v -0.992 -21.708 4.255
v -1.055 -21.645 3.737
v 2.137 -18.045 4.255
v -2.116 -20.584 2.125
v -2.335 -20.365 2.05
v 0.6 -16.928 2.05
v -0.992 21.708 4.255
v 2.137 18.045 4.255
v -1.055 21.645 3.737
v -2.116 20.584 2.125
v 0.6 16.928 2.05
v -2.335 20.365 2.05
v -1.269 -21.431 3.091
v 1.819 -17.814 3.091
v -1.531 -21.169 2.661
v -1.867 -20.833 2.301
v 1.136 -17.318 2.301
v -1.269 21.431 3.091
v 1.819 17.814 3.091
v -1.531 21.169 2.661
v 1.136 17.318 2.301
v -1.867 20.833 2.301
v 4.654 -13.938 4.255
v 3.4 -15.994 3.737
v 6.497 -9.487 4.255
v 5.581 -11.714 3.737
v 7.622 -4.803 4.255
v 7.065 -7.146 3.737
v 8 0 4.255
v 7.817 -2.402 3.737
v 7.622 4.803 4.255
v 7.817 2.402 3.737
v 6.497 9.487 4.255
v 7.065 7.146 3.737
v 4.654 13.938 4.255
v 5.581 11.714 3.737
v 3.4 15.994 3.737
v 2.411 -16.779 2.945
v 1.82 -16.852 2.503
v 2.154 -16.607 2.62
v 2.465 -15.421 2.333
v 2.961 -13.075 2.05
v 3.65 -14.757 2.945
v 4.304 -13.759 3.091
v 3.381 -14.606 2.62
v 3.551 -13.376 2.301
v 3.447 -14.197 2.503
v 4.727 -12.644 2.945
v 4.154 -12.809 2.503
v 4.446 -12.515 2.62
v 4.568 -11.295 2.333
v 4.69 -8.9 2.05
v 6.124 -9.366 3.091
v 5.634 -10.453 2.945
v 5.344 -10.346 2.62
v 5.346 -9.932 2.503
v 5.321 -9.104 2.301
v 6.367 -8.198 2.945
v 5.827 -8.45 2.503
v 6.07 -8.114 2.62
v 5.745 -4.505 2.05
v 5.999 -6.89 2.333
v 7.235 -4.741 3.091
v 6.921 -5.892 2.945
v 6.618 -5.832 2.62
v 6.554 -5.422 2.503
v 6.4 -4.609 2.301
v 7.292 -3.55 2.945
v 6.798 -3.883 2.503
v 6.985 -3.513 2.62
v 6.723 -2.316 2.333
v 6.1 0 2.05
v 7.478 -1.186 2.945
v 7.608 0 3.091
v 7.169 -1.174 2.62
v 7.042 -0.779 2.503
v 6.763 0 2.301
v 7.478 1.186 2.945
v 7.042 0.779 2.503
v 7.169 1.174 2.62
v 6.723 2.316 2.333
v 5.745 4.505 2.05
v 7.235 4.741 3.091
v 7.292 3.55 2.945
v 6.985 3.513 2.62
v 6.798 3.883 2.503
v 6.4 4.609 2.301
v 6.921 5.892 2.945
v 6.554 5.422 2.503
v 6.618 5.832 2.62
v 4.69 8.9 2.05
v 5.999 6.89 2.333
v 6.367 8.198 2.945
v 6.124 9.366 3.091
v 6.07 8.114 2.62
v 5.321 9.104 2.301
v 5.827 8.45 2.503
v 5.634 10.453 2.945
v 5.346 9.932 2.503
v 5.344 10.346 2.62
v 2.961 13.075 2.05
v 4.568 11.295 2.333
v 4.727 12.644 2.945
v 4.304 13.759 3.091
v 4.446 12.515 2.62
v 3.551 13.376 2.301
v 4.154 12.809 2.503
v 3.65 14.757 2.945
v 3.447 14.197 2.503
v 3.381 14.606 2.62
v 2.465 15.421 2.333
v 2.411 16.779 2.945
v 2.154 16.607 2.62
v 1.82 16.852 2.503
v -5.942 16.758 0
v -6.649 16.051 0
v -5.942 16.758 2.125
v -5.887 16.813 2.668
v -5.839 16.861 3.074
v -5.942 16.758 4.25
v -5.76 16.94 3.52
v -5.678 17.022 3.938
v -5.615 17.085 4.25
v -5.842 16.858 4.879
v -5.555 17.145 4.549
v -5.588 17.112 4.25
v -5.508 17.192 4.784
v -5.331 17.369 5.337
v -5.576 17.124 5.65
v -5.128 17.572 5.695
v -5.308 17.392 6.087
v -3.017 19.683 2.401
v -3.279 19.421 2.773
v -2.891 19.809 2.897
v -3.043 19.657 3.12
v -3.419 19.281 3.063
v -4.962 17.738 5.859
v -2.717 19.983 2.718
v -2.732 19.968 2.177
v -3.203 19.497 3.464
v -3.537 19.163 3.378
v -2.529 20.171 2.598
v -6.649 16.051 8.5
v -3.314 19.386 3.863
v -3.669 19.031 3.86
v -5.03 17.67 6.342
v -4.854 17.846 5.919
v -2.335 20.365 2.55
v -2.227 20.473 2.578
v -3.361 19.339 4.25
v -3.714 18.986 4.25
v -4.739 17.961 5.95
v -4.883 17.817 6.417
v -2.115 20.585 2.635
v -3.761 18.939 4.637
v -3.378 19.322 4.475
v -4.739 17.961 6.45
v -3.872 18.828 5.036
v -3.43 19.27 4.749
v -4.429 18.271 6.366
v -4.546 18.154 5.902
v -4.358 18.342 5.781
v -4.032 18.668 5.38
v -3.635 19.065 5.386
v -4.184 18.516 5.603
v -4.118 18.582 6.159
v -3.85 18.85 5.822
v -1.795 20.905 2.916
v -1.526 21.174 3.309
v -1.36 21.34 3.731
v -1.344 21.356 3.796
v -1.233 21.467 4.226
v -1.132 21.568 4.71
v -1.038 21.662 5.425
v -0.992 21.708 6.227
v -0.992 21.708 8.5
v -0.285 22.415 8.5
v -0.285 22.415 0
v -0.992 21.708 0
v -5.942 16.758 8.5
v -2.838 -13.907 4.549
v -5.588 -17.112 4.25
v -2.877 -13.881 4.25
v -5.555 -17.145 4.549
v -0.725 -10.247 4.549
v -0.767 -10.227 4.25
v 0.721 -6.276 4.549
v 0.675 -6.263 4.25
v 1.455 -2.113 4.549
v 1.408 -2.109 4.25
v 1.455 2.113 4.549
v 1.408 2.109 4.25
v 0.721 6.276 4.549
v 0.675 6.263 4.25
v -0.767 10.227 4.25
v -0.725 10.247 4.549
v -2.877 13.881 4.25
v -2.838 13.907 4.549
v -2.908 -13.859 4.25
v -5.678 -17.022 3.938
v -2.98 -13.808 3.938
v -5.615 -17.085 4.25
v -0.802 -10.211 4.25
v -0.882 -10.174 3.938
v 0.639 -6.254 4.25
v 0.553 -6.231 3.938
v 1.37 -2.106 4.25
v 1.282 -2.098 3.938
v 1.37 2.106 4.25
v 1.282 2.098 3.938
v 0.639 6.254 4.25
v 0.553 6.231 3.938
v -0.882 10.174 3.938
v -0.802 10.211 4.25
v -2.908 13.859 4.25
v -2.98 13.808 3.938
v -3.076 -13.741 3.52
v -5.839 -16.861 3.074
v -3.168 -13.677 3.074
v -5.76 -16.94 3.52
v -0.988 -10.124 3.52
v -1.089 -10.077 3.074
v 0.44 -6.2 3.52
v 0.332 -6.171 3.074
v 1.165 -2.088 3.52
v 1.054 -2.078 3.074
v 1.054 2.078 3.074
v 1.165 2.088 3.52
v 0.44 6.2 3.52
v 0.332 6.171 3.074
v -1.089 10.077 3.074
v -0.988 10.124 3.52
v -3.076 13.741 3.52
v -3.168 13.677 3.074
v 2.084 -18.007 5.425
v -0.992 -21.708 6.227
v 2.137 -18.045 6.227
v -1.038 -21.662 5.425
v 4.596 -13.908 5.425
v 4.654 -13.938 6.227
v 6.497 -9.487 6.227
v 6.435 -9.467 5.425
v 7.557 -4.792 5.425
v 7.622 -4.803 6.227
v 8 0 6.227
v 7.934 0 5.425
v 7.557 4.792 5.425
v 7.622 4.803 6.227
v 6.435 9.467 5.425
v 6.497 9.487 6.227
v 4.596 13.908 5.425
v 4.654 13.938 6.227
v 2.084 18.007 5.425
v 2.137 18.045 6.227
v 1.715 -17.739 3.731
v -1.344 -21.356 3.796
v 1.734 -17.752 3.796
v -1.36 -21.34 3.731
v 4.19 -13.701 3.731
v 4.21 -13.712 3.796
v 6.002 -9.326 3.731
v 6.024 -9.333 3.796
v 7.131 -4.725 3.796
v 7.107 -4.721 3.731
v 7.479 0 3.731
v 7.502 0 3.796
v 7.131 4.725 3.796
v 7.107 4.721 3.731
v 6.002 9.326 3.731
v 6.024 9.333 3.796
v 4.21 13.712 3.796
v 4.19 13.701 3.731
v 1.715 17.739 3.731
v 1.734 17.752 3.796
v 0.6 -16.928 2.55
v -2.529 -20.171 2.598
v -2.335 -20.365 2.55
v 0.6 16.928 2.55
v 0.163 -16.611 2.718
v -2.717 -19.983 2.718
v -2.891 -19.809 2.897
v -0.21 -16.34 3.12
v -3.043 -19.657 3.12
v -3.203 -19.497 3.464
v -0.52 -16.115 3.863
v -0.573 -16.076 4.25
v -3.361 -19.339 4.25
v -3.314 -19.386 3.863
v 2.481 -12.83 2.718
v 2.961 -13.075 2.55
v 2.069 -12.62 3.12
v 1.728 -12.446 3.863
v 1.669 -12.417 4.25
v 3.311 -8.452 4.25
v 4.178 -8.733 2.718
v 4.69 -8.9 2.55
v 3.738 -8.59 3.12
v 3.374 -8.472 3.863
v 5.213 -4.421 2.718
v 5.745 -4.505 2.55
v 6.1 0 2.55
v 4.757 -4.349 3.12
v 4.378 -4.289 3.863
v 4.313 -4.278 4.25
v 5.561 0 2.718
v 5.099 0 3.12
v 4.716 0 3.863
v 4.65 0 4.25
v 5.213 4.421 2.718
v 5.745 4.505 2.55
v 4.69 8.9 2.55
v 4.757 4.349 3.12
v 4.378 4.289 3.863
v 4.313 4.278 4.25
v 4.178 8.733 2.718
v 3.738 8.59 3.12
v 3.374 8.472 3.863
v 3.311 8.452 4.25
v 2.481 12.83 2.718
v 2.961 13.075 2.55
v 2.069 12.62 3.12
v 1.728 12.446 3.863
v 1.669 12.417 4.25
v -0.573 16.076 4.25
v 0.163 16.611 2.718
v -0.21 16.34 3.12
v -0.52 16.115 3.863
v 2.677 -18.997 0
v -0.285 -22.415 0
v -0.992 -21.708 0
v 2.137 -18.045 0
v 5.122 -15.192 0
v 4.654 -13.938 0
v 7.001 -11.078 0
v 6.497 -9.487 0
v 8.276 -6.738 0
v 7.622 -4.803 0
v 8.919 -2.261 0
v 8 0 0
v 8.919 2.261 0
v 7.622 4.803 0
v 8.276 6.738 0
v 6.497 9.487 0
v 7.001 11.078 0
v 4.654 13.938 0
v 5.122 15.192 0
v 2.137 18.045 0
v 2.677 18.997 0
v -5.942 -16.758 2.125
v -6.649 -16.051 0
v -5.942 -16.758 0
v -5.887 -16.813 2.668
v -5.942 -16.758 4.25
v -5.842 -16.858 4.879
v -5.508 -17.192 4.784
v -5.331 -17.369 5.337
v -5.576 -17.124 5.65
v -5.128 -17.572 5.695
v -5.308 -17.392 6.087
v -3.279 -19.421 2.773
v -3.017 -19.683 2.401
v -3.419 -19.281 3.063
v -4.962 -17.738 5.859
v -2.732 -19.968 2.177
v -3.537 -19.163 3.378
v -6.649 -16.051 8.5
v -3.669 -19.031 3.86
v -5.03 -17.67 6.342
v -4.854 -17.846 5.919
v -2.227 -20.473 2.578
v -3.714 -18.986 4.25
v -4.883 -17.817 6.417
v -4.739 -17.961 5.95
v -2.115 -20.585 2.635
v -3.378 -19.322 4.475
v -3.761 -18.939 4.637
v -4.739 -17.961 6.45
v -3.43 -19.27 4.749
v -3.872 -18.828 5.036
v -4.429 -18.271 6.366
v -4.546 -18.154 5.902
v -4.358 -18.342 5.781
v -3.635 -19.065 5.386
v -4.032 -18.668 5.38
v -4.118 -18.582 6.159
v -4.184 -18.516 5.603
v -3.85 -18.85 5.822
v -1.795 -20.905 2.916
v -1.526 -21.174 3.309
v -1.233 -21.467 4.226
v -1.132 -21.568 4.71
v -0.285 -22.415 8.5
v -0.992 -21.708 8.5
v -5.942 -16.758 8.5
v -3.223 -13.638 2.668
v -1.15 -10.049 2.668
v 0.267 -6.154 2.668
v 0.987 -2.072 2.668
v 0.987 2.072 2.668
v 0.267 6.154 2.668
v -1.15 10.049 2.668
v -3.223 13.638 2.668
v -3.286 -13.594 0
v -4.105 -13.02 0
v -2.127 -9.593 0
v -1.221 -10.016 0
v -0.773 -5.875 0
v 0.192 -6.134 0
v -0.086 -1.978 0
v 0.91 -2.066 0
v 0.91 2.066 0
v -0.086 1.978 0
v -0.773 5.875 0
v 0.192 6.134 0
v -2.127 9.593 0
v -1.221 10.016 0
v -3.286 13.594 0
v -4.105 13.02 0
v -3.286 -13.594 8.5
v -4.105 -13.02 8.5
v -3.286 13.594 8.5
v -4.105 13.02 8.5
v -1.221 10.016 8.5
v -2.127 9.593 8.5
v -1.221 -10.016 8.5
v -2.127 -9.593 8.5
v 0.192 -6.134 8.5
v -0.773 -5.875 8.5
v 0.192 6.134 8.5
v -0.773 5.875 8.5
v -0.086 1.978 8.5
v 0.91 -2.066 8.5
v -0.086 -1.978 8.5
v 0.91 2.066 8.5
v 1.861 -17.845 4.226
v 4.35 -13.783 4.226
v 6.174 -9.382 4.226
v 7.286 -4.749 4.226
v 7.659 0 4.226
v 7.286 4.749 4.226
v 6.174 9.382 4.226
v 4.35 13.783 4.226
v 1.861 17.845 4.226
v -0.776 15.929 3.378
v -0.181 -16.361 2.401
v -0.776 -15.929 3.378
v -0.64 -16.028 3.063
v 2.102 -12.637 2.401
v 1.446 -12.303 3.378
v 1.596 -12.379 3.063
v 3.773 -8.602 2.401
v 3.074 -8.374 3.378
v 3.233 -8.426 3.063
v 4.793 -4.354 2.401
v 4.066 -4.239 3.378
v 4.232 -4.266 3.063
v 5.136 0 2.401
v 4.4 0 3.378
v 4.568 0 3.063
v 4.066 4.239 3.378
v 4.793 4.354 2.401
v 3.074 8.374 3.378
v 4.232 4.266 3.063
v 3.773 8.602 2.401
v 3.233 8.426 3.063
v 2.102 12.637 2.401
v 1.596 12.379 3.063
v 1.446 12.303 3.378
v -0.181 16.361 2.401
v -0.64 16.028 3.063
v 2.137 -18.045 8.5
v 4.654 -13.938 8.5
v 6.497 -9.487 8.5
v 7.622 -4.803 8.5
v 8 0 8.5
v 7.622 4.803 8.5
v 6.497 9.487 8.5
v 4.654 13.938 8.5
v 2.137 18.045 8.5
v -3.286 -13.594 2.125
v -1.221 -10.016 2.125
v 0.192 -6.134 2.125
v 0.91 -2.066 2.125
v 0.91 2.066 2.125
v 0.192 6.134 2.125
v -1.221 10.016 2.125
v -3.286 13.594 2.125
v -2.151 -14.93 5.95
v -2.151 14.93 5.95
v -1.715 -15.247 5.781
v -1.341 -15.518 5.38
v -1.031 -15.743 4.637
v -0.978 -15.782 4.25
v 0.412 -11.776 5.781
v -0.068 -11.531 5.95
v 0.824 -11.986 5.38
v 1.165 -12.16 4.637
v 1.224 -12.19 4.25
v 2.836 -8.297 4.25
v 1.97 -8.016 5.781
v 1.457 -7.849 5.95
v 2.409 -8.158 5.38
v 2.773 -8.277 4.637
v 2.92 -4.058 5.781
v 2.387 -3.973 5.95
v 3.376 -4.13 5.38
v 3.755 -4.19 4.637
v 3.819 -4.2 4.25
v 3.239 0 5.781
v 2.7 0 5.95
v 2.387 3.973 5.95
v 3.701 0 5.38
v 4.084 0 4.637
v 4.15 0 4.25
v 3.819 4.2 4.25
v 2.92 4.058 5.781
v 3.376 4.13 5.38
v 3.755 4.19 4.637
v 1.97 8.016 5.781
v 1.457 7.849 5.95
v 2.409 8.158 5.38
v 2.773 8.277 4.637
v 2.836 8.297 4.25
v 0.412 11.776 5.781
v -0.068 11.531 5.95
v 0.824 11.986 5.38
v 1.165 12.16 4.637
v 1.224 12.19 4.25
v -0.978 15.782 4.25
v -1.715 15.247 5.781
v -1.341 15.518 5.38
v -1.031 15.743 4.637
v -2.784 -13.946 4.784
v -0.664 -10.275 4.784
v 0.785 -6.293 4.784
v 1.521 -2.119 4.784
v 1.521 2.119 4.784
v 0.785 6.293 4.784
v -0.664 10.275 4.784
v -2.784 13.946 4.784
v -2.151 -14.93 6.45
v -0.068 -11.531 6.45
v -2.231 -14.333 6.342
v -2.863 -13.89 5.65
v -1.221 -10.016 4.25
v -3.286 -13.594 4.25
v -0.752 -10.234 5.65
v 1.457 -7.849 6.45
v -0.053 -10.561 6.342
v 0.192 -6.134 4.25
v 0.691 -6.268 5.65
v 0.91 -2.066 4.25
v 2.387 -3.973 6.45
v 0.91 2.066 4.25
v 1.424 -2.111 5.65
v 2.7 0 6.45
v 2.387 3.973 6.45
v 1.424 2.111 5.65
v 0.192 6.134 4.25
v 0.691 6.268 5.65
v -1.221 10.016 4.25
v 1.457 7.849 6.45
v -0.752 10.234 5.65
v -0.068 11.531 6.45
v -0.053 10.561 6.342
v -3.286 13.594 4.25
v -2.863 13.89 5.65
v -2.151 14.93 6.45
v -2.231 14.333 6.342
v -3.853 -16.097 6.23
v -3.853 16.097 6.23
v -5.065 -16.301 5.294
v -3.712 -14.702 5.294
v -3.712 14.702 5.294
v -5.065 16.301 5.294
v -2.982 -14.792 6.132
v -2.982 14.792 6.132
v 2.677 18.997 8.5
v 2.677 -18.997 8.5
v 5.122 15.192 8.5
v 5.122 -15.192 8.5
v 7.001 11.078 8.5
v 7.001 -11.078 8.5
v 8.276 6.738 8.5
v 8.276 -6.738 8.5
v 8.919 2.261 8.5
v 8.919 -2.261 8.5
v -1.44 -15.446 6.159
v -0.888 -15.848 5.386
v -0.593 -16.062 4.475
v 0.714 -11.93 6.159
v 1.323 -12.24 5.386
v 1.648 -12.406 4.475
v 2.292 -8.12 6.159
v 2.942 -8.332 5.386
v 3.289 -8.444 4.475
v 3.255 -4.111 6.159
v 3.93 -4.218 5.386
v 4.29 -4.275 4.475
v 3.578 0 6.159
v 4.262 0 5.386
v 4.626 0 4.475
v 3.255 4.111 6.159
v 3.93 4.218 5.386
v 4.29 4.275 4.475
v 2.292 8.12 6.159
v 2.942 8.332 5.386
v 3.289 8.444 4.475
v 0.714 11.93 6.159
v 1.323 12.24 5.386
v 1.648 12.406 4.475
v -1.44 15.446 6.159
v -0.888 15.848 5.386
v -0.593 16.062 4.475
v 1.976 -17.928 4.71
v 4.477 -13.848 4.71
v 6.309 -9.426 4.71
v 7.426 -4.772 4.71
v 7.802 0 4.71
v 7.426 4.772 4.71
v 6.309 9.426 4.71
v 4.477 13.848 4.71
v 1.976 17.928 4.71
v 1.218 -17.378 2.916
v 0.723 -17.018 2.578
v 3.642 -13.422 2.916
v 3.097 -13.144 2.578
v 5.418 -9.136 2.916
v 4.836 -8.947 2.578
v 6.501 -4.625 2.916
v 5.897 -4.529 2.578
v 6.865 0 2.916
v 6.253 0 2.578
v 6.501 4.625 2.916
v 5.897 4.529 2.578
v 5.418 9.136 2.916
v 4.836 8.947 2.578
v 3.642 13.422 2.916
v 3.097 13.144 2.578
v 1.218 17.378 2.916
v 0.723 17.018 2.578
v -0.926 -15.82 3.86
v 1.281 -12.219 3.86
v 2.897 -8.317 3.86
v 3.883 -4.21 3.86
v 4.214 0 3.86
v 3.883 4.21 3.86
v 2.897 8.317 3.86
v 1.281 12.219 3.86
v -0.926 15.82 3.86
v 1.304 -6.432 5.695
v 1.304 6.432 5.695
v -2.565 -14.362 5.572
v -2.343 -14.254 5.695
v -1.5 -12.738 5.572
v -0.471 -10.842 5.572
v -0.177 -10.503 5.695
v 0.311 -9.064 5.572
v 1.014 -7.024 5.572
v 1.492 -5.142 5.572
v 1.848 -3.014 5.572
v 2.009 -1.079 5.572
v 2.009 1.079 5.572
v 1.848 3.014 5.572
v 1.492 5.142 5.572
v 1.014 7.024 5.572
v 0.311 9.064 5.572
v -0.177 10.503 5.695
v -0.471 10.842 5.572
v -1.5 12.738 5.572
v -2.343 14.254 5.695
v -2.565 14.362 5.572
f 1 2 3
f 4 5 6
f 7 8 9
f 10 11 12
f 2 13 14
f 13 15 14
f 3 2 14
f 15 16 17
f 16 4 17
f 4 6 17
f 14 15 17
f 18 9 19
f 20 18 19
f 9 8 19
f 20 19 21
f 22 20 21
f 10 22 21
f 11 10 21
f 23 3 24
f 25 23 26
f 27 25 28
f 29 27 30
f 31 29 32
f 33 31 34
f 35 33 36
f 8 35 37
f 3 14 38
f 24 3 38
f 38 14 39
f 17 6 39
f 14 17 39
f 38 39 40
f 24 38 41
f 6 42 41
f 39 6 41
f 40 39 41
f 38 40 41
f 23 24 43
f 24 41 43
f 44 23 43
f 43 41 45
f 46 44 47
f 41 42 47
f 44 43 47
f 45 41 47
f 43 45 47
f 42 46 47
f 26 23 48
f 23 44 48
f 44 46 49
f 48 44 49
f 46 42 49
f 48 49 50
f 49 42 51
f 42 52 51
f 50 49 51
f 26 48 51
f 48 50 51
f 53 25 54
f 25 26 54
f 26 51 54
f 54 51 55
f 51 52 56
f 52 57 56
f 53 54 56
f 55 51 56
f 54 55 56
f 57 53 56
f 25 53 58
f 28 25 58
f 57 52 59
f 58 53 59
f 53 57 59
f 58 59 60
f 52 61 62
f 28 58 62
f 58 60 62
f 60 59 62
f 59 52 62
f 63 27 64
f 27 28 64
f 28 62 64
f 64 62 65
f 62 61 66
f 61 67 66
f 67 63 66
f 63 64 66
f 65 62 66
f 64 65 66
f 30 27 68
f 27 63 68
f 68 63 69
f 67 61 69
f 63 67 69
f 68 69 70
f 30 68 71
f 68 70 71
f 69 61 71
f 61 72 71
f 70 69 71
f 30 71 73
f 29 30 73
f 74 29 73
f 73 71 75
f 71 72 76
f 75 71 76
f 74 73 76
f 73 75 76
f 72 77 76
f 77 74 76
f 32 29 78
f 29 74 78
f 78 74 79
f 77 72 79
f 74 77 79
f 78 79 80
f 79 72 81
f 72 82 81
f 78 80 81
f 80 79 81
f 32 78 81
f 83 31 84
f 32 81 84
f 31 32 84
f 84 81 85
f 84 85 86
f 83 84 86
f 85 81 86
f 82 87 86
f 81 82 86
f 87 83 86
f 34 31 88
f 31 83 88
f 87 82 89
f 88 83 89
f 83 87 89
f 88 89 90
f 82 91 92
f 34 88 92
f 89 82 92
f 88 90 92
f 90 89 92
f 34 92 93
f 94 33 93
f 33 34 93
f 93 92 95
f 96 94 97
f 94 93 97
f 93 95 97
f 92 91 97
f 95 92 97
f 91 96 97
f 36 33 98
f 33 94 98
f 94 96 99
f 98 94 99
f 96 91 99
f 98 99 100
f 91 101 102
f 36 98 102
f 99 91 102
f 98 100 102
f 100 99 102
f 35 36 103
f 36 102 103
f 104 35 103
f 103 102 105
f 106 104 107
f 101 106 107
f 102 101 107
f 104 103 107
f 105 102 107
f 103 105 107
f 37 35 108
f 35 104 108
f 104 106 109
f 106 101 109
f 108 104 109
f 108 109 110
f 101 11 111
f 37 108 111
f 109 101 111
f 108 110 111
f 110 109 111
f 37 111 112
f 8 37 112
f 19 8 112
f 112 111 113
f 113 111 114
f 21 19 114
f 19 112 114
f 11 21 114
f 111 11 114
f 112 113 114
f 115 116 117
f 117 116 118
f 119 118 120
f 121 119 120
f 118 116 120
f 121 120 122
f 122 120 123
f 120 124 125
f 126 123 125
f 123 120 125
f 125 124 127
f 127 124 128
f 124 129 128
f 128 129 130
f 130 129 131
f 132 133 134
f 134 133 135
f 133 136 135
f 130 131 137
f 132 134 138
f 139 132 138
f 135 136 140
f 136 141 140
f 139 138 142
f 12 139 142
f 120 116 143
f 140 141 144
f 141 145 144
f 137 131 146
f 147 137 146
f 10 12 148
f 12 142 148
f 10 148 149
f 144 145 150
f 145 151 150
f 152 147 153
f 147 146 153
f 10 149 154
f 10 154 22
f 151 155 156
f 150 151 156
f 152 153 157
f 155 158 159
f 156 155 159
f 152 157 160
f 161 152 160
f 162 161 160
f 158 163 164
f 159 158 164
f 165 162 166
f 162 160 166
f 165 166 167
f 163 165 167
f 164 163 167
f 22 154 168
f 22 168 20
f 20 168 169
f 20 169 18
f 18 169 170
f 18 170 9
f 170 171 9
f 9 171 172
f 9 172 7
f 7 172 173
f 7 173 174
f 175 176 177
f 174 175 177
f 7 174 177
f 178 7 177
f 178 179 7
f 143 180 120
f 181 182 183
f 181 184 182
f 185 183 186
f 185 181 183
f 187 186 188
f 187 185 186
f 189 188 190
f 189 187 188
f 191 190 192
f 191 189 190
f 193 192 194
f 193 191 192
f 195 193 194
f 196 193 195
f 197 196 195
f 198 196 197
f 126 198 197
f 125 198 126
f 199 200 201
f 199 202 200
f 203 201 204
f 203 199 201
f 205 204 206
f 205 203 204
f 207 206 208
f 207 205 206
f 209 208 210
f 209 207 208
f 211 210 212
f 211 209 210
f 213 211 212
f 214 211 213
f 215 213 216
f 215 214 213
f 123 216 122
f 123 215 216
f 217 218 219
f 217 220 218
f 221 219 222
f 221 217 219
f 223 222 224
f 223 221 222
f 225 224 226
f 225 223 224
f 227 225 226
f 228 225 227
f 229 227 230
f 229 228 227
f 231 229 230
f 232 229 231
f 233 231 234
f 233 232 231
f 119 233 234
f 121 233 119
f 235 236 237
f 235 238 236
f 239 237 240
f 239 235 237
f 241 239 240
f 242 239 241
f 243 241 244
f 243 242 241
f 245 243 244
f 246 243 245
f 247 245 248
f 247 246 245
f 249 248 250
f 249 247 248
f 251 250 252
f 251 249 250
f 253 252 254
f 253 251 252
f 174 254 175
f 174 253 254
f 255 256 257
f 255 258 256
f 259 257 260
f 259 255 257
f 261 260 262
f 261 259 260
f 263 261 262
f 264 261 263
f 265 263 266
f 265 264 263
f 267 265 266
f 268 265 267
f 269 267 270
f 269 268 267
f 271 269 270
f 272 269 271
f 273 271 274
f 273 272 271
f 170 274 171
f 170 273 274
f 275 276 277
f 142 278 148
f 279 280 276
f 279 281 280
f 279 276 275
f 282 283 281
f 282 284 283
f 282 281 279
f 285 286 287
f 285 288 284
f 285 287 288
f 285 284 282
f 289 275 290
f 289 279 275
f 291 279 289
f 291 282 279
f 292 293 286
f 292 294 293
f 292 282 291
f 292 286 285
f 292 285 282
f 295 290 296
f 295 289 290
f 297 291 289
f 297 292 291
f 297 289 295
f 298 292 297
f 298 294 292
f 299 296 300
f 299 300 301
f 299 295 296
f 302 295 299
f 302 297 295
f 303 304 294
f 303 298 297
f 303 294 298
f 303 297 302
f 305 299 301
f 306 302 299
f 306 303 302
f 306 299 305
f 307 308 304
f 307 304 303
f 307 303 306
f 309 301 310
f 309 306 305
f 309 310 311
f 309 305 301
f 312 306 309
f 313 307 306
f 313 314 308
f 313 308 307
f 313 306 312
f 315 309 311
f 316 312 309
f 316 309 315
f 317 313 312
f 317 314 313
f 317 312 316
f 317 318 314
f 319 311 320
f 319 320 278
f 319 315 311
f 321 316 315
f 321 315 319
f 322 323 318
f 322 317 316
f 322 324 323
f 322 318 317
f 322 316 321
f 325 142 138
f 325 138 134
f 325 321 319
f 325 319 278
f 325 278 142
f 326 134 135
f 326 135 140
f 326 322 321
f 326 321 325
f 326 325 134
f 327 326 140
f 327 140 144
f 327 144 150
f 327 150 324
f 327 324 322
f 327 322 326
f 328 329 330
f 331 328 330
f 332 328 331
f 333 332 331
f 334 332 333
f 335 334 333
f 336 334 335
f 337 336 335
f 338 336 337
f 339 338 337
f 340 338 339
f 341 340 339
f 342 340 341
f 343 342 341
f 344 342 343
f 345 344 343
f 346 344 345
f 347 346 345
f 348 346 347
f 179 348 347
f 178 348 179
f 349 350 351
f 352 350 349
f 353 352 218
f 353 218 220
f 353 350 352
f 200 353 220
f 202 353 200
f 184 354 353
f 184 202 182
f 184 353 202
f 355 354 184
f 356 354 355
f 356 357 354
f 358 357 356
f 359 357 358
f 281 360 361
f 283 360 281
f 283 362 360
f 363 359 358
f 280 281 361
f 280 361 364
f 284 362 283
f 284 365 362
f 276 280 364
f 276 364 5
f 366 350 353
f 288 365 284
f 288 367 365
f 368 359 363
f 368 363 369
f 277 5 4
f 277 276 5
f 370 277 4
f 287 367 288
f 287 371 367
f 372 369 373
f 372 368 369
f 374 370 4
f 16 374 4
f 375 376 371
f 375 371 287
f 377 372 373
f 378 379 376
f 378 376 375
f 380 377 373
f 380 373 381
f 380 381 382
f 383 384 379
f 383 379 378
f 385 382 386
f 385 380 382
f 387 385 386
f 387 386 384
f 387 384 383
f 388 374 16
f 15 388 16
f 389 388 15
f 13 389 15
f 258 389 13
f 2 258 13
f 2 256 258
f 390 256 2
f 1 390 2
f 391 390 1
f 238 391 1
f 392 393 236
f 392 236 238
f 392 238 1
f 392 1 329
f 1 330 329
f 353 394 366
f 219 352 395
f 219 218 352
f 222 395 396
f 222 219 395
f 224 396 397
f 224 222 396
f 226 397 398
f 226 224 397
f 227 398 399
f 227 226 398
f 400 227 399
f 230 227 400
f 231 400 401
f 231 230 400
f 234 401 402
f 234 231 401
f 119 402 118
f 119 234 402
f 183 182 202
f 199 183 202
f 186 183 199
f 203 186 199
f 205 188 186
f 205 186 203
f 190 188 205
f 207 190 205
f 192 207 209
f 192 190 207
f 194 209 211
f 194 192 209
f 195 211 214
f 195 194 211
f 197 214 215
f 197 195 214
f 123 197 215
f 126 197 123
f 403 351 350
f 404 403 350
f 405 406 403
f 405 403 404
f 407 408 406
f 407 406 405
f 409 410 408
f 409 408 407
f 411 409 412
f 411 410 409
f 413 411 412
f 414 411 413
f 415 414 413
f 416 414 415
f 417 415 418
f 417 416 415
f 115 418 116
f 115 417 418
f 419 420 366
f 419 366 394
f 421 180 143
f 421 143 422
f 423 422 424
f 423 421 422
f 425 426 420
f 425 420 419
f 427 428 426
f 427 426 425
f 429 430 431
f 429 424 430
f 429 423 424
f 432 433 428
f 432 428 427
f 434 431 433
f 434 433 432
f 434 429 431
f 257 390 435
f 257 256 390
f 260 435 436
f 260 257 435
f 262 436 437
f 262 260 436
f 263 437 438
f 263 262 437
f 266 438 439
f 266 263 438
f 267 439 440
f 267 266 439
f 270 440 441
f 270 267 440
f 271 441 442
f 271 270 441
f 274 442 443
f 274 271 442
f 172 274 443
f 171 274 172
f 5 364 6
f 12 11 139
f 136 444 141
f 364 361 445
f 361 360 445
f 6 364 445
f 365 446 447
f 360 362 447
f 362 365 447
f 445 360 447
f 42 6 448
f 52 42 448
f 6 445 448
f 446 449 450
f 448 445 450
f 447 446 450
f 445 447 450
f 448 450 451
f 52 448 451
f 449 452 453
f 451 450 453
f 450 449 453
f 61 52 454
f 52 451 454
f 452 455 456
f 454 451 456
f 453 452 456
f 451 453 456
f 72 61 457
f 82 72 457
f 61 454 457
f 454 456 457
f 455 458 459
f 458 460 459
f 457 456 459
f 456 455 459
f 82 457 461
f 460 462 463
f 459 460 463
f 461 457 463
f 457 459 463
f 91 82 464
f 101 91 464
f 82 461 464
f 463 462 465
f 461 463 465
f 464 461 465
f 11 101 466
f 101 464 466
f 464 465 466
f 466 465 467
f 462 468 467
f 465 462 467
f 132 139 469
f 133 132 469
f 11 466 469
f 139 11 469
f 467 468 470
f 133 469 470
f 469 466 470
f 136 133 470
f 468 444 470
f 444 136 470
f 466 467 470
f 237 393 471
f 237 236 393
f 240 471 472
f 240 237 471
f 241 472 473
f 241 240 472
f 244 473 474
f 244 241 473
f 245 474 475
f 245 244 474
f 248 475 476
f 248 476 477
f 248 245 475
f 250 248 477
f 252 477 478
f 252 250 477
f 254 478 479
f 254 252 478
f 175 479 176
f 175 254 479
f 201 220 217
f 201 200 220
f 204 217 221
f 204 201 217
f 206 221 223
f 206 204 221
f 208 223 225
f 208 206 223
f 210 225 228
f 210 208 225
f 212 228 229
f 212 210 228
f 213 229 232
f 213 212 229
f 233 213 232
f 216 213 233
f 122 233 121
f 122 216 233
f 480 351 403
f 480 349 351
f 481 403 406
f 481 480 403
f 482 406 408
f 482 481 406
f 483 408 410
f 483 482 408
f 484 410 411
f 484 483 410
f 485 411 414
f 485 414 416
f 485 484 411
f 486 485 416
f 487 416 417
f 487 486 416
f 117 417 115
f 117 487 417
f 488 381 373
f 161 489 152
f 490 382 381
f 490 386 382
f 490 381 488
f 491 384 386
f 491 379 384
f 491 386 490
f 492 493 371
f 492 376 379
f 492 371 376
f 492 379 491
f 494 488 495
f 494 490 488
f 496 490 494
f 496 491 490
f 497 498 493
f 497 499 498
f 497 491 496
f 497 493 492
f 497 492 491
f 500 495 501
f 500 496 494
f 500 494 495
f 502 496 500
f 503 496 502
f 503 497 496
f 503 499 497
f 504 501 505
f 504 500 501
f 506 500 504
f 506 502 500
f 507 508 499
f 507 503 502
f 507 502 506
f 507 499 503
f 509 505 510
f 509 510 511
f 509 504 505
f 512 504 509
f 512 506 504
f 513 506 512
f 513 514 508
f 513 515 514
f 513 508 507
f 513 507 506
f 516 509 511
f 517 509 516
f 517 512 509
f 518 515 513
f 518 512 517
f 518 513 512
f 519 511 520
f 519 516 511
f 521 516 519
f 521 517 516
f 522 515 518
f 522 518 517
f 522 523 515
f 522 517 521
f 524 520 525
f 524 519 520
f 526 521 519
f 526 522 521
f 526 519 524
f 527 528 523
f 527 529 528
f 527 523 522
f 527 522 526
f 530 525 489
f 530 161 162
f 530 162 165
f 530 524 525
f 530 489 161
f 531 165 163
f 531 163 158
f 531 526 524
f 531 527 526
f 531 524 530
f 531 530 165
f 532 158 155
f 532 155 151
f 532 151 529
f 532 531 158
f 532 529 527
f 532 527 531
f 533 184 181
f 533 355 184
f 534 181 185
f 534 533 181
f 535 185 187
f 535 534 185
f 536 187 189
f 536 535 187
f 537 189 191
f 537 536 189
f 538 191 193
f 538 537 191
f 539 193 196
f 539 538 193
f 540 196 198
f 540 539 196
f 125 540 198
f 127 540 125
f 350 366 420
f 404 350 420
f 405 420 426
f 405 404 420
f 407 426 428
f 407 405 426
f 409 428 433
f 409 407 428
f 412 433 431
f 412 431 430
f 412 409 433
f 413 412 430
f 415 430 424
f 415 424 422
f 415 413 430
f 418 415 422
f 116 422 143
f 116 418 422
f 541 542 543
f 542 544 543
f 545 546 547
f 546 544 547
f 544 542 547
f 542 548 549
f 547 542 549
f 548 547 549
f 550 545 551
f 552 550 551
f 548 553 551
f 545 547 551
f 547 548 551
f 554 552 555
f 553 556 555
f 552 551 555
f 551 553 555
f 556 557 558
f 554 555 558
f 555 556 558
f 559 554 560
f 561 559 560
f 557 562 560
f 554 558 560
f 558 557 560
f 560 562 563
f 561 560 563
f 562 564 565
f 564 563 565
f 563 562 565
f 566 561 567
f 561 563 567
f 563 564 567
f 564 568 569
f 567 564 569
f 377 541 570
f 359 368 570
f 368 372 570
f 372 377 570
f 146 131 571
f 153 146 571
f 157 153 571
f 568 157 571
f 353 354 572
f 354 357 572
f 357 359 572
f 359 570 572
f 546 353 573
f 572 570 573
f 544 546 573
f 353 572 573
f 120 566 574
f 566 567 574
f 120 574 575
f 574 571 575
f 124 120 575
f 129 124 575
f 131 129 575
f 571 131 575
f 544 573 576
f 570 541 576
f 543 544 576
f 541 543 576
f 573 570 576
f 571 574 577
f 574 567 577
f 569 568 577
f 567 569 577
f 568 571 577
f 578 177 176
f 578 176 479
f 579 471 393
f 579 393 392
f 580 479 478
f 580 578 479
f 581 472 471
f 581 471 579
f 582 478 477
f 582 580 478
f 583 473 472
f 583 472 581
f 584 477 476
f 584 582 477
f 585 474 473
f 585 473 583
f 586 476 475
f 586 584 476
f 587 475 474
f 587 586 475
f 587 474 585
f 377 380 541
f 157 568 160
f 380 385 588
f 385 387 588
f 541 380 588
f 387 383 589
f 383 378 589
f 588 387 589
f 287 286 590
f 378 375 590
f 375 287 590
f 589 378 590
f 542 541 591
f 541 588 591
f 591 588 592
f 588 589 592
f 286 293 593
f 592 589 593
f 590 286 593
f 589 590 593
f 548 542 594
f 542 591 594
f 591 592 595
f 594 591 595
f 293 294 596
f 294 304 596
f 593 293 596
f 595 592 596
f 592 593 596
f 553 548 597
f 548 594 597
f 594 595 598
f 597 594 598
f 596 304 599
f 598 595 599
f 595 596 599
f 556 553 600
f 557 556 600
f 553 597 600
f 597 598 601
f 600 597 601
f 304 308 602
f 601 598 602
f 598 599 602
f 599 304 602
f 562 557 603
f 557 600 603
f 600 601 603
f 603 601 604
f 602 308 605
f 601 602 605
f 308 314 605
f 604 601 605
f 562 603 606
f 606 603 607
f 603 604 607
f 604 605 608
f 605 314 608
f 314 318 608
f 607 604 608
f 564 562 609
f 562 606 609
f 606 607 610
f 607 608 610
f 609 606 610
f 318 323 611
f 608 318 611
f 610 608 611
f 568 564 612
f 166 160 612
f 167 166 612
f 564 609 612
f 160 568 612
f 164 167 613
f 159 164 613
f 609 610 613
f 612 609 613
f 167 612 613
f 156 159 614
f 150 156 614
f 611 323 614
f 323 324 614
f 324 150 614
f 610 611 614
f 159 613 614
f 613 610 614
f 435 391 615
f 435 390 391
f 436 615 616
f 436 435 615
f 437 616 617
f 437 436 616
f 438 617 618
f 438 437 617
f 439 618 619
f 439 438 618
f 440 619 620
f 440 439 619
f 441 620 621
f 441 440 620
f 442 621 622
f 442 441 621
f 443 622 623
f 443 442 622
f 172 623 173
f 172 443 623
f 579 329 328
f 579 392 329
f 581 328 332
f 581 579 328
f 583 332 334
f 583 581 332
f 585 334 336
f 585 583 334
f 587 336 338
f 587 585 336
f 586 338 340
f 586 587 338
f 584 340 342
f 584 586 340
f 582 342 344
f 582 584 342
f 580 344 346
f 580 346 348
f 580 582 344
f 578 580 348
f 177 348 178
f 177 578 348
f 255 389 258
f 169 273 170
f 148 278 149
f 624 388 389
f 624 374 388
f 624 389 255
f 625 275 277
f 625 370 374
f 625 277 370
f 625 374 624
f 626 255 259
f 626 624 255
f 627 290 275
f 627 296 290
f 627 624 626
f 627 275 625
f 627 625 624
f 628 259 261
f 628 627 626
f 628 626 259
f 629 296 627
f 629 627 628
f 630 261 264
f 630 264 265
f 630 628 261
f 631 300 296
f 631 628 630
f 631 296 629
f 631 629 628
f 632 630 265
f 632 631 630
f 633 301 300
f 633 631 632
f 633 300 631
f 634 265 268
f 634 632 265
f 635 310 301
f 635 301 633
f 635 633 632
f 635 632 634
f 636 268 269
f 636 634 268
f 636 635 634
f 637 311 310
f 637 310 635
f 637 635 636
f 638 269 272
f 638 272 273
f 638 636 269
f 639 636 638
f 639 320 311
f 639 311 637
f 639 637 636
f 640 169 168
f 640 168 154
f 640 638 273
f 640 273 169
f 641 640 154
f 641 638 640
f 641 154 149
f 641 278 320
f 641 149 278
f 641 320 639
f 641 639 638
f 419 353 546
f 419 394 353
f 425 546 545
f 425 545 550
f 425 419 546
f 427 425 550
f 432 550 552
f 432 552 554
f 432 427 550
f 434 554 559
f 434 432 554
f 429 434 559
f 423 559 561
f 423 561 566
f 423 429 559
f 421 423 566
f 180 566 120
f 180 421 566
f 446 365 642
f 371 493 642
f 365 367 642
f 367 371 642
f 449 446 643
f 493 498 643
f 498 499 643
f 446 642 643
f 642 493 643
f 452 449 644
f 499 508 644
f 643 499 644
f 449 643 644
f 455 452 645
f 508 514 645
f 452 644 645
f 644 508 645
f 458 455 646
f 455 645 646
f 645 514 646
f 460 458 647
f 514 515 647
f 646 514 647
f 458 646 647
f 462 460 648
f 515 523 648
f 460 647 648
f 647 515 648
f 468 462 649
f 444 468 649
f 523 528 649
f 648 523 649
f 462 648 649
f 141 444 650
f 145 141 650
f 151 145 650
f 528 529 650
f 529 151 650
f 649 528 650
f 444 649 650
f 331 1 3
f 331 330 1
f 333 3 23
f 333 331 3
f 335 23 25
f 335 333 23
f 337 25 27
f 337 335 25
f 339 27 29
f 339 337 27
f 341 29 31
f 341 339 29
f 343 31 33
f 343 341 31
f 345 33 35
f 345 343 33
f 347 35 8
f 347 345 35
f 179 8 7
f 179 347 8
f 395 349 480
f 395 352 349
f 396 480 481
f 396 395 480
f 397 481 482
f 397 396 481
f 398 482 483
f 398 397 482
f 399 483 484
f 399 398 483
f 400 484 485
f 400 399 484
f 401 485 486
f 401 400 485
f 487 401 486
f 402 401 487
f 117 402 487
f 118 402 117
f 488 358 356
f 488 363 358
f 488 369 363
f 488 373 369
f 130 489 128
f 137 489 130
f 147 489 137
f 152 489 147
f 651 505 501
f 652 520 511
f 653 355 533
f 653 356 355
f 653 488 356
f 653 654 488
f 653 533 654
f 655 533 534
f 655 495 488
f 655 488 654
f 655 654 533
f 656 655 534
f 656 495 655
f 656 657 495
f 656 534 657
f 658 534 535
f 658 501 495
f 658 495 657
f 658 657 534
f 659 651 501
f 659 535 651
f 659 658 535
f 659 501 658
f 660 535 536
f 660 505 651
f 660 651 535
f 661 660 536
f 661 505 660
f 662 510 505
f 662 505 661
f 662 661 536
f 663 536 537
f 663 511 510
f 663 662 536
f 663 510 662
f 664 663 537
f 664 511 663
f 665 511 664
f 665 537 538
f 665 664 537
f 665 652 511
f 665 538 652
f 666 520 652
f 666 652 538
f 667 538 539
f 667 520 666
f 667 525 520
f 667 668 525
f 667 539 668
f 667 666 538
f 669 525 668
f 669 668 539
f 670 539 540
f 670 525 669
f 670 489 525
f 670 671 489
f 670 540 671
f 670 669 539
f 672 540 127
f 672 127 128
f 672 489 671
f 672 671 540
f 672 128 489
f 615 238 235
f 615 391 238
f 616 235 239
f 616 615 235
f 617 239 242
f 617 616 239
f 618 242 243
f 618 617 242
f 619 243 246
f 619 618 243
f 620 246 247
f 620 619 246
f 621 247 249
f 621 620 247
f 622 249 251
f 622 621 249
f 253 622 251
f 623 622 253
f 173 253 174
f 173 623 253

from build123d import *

# Parameters (mm, degrees)
F1_ANGLE_BACK = 45
F1_ANGLE      = 90


# Not quite as in the source:
# - ends of sketch curves that miss each other by under 0.0002 mm in the source are joined


with BuildPart() as f1:
    # F0 (on Front) → F1 (revolve)
    with BuildSketch(Plane.XZ, mode=Mode.PRIVATE) as f1_sk:
        Polygon((8, 4.2551231384), (8, 0), (9, 0), (9, 8.5), (8, 8.5), (8, 6.2273216248), align=None)
        Polygon((1, 2.124959883), (1, 4.2499679064), (1, 8.5), (0, 8.5), (0, 0), (1, 0), align=None)
        with BuildLine():
            add(Edge.make_bspline(
                [(1.6135353927, 4.7835650405), (1.6750901529, 4.970267715), (1.9288235062, 5.5585034544), (2.3534665623, 5.9191497273), (2.7, 5.9499679064)],
                knots=[0.2683438661, 0.2683438661, 0.2683438661, 0.2683438661, 0.5126436151, 1, 1, 1, 1], degree=3))
            Line((2.7, 5.9499679064), (2.7, 6.4499679064))
            add(Edge.make_bspline(
                [(1, 4.2499679064), (1.0015353048, 4.5626104683), (1.4551687546, 5.9442127178), (2.3433097433, 6.4271380926), (2.7, 6.4499679064)],
                knots=[0, 0, 0, 0, 0.5304369026, 1, 1, 1, 1], degree=3))
            Line((1, 4.2499679064), (1.4618344062, 4.2499679064))
            Line((1.4618344062, 4.2499679064), (1.5469024263, 4.5491884505))
            add(Edge.make_bspline(
                [(1.5469024263, 4.5491884505), (1.5645406816, 4.6235882391), (1.5868631876, 4.702665172), (1.6135353927, 4.7835650405)],
                knots=[0.1624866916, 0.1624866916, 0.1624866916, 0.1624866916, 0.2683438661, 0.2683438661, 0.2683438661, 0.2683438661], degree=3))
        make_face()
        with BuildLine():
            add(Edge.make_bspline(
                [(8, 4.2551231384), (7.9986488935, 3.9799898766), (7.7456702226, 2.8557466438), (6.505031952, 2.0758276235), (6.1, 2.0499037191)],
                knots=[0, 0, 0, 0, 0.4667977205, 1, 1, 1, 1], degree=3))
            Line((8, 4.2551231384), (8, 6.2273216248))
            Line((8, 6.2273216248), (7.9344944983, 5.4252070189))
            Line((7.9344944983, 5.4252070189), (7.801741117, 4.7100675088))
            Line((7.801741117, 4.7100675088), (7.6594823926, 4.2259131372))
            Line((7.6594823926, 4.2259131372), (7.5023478676, 3.7956271327))
            add(Edge.make_bspline(
                [(7.5023478676, 3.7956271327), (7.4950709382, 3.7744309229), (7.487268414, 3.753028112), (7.4789151485, 3.7314606417)],
                knots=[0.2362923479, 0.2362923479, 0.2362923479, 0.2362923479, 0.2672769863, 0.2672769863, 0.2672769863, 0.2672769863], degree=3))
            add(Edge.make_bspline(
                [(7.4789151485, 3.7314606417), (7.429977914, 3.6051085751), (7.1561404277, 3.07227024), (6.4919298971, 2.5847591313), (6.1, 2.5499037191)],
                knots=[0.2672769863, 0.2672769863, 0.2672769863, 0.2672769863, 0.4487991142, 1, 1, 1, 1], degree=3))
            add(Edge.make_bspline(
                [(6.1, 2.5499037191), (5.722922109, 2.560753403), (4.9562868612, 3.0652346955), (4.6679732537, 3.9028036589), (4.6499999995, 4.249903719)],
                knots=[0, 0, 0, 0, 0.5008610447, 1, 1, 1, 1], degree=3))
            add(Edge.make_bspline(
                [(2.7, 6.4499679064), (3.0971914861, 6.4159367347), (4.0379566942, 6.1199675516), (4.6572574431, 4.6342403799), (4.6499999995, 4.249903719)],
                knots=[0, 0, 0, 0, 0.4611151657, 0.9982015649, 0.9982015649, 0.9982015649, 0.9982015649], degree=3))
            Line((2.7, 6.4499679064), (2.7, 5.9499679064))
            add(Edge.make_bspline(
                [(2.7, 5.9499679064), (3.0770804596, 5.9391181486), (3.8437046032, 5.4345511486), (4.1320268683, 4.5970014065), (4.1499999995, 4.249903719)],
                knots=[0, 0, 0, 0, 0.5008644565, 1, 1, 1, 1], degree=3))
            add(Edge.make_bspline(
                [(4.3999999995, 3.3776864381), (4.2426068049, 3.7097412493), (4.1460321192, 4.0410870495), (4.1499999995, 4.249903719)],
                knots=[0.7063927669, 0.7063927669, 0.7063927669, 0.7063927669, 0.9982015652, 0.9982015652, 0.9982015652, 0.9982015652], degree=3))
            add(Edge.make_bspline(
                [(6.1, 2.0499037191), (5.7028107176, 2.0839347019), (5.0370554507, 2.2933169546), (4.5322969972, 3.0985774544), (4.3999999995, 3.3776864381)],
                knots=[0, 0, 0, 0, 0.4611126073, 0.7063927669, 0.7063927669, 0.7063927669, 0.7063927669], degree=3))
        make_face()
        with BuildLine():
            Line((1.5469024263, 4.5491884505), (1.6135353927, 4.7835650405))
            add(Edge.make_bspline(
                [(1.5469024263, 4.5491884505), (1.5645406816, 4.6235882391), (1.5868631876, 4.702665172), (1.6135353927, 4.7835650405)],
                knots=[0.1624866916, 0.1624866916, 0.1624866916, 0.1624866916, 0.2683438661, 0.2683438661, 0.2683438661, 0.2683438661], degree=3))
        make_face()
        Polygon((1.4618344062, 4.2499679064), (1, 4.2499679064), (1, 2.124959883), (1.0774135864, 2.6683010762), (1.144714681, 3.0744322246), (1.2561492896, 3.5201706593), (1.3731569326, 3.9380513733), align=None)
        with BuildLine():
            add(Edge.make_bspline(
                [(1.5, 4.2499679064), (1.5037909347, 4.3318066745), (1.5198283827, 4.4349876364), (1.5469024263, 4.5491884505)],
                knots=[0, 0, 0, 0, 0.1624866916, 0.1624866916, 0.1624866916, 0.1624866916], degree=3))
            Line((1.5469024263, 4.5491884505), (1.4618344062, 4.2499679064))
            Line((1.4618344062, 4.2499679064), (1.5, 4.2499679064))
        make_face()
    revolve(f1_sk.sketch.rotate(Axis((-22.7, 0, 2.7579944581), (0, 0, 1)), -F1_ANGLE_BACK), axis=Axis((-22.7, 0, 2.7579944581), (0, 0, 1)), revolution_arc=F1_ANGLE)


solid = f1.part
